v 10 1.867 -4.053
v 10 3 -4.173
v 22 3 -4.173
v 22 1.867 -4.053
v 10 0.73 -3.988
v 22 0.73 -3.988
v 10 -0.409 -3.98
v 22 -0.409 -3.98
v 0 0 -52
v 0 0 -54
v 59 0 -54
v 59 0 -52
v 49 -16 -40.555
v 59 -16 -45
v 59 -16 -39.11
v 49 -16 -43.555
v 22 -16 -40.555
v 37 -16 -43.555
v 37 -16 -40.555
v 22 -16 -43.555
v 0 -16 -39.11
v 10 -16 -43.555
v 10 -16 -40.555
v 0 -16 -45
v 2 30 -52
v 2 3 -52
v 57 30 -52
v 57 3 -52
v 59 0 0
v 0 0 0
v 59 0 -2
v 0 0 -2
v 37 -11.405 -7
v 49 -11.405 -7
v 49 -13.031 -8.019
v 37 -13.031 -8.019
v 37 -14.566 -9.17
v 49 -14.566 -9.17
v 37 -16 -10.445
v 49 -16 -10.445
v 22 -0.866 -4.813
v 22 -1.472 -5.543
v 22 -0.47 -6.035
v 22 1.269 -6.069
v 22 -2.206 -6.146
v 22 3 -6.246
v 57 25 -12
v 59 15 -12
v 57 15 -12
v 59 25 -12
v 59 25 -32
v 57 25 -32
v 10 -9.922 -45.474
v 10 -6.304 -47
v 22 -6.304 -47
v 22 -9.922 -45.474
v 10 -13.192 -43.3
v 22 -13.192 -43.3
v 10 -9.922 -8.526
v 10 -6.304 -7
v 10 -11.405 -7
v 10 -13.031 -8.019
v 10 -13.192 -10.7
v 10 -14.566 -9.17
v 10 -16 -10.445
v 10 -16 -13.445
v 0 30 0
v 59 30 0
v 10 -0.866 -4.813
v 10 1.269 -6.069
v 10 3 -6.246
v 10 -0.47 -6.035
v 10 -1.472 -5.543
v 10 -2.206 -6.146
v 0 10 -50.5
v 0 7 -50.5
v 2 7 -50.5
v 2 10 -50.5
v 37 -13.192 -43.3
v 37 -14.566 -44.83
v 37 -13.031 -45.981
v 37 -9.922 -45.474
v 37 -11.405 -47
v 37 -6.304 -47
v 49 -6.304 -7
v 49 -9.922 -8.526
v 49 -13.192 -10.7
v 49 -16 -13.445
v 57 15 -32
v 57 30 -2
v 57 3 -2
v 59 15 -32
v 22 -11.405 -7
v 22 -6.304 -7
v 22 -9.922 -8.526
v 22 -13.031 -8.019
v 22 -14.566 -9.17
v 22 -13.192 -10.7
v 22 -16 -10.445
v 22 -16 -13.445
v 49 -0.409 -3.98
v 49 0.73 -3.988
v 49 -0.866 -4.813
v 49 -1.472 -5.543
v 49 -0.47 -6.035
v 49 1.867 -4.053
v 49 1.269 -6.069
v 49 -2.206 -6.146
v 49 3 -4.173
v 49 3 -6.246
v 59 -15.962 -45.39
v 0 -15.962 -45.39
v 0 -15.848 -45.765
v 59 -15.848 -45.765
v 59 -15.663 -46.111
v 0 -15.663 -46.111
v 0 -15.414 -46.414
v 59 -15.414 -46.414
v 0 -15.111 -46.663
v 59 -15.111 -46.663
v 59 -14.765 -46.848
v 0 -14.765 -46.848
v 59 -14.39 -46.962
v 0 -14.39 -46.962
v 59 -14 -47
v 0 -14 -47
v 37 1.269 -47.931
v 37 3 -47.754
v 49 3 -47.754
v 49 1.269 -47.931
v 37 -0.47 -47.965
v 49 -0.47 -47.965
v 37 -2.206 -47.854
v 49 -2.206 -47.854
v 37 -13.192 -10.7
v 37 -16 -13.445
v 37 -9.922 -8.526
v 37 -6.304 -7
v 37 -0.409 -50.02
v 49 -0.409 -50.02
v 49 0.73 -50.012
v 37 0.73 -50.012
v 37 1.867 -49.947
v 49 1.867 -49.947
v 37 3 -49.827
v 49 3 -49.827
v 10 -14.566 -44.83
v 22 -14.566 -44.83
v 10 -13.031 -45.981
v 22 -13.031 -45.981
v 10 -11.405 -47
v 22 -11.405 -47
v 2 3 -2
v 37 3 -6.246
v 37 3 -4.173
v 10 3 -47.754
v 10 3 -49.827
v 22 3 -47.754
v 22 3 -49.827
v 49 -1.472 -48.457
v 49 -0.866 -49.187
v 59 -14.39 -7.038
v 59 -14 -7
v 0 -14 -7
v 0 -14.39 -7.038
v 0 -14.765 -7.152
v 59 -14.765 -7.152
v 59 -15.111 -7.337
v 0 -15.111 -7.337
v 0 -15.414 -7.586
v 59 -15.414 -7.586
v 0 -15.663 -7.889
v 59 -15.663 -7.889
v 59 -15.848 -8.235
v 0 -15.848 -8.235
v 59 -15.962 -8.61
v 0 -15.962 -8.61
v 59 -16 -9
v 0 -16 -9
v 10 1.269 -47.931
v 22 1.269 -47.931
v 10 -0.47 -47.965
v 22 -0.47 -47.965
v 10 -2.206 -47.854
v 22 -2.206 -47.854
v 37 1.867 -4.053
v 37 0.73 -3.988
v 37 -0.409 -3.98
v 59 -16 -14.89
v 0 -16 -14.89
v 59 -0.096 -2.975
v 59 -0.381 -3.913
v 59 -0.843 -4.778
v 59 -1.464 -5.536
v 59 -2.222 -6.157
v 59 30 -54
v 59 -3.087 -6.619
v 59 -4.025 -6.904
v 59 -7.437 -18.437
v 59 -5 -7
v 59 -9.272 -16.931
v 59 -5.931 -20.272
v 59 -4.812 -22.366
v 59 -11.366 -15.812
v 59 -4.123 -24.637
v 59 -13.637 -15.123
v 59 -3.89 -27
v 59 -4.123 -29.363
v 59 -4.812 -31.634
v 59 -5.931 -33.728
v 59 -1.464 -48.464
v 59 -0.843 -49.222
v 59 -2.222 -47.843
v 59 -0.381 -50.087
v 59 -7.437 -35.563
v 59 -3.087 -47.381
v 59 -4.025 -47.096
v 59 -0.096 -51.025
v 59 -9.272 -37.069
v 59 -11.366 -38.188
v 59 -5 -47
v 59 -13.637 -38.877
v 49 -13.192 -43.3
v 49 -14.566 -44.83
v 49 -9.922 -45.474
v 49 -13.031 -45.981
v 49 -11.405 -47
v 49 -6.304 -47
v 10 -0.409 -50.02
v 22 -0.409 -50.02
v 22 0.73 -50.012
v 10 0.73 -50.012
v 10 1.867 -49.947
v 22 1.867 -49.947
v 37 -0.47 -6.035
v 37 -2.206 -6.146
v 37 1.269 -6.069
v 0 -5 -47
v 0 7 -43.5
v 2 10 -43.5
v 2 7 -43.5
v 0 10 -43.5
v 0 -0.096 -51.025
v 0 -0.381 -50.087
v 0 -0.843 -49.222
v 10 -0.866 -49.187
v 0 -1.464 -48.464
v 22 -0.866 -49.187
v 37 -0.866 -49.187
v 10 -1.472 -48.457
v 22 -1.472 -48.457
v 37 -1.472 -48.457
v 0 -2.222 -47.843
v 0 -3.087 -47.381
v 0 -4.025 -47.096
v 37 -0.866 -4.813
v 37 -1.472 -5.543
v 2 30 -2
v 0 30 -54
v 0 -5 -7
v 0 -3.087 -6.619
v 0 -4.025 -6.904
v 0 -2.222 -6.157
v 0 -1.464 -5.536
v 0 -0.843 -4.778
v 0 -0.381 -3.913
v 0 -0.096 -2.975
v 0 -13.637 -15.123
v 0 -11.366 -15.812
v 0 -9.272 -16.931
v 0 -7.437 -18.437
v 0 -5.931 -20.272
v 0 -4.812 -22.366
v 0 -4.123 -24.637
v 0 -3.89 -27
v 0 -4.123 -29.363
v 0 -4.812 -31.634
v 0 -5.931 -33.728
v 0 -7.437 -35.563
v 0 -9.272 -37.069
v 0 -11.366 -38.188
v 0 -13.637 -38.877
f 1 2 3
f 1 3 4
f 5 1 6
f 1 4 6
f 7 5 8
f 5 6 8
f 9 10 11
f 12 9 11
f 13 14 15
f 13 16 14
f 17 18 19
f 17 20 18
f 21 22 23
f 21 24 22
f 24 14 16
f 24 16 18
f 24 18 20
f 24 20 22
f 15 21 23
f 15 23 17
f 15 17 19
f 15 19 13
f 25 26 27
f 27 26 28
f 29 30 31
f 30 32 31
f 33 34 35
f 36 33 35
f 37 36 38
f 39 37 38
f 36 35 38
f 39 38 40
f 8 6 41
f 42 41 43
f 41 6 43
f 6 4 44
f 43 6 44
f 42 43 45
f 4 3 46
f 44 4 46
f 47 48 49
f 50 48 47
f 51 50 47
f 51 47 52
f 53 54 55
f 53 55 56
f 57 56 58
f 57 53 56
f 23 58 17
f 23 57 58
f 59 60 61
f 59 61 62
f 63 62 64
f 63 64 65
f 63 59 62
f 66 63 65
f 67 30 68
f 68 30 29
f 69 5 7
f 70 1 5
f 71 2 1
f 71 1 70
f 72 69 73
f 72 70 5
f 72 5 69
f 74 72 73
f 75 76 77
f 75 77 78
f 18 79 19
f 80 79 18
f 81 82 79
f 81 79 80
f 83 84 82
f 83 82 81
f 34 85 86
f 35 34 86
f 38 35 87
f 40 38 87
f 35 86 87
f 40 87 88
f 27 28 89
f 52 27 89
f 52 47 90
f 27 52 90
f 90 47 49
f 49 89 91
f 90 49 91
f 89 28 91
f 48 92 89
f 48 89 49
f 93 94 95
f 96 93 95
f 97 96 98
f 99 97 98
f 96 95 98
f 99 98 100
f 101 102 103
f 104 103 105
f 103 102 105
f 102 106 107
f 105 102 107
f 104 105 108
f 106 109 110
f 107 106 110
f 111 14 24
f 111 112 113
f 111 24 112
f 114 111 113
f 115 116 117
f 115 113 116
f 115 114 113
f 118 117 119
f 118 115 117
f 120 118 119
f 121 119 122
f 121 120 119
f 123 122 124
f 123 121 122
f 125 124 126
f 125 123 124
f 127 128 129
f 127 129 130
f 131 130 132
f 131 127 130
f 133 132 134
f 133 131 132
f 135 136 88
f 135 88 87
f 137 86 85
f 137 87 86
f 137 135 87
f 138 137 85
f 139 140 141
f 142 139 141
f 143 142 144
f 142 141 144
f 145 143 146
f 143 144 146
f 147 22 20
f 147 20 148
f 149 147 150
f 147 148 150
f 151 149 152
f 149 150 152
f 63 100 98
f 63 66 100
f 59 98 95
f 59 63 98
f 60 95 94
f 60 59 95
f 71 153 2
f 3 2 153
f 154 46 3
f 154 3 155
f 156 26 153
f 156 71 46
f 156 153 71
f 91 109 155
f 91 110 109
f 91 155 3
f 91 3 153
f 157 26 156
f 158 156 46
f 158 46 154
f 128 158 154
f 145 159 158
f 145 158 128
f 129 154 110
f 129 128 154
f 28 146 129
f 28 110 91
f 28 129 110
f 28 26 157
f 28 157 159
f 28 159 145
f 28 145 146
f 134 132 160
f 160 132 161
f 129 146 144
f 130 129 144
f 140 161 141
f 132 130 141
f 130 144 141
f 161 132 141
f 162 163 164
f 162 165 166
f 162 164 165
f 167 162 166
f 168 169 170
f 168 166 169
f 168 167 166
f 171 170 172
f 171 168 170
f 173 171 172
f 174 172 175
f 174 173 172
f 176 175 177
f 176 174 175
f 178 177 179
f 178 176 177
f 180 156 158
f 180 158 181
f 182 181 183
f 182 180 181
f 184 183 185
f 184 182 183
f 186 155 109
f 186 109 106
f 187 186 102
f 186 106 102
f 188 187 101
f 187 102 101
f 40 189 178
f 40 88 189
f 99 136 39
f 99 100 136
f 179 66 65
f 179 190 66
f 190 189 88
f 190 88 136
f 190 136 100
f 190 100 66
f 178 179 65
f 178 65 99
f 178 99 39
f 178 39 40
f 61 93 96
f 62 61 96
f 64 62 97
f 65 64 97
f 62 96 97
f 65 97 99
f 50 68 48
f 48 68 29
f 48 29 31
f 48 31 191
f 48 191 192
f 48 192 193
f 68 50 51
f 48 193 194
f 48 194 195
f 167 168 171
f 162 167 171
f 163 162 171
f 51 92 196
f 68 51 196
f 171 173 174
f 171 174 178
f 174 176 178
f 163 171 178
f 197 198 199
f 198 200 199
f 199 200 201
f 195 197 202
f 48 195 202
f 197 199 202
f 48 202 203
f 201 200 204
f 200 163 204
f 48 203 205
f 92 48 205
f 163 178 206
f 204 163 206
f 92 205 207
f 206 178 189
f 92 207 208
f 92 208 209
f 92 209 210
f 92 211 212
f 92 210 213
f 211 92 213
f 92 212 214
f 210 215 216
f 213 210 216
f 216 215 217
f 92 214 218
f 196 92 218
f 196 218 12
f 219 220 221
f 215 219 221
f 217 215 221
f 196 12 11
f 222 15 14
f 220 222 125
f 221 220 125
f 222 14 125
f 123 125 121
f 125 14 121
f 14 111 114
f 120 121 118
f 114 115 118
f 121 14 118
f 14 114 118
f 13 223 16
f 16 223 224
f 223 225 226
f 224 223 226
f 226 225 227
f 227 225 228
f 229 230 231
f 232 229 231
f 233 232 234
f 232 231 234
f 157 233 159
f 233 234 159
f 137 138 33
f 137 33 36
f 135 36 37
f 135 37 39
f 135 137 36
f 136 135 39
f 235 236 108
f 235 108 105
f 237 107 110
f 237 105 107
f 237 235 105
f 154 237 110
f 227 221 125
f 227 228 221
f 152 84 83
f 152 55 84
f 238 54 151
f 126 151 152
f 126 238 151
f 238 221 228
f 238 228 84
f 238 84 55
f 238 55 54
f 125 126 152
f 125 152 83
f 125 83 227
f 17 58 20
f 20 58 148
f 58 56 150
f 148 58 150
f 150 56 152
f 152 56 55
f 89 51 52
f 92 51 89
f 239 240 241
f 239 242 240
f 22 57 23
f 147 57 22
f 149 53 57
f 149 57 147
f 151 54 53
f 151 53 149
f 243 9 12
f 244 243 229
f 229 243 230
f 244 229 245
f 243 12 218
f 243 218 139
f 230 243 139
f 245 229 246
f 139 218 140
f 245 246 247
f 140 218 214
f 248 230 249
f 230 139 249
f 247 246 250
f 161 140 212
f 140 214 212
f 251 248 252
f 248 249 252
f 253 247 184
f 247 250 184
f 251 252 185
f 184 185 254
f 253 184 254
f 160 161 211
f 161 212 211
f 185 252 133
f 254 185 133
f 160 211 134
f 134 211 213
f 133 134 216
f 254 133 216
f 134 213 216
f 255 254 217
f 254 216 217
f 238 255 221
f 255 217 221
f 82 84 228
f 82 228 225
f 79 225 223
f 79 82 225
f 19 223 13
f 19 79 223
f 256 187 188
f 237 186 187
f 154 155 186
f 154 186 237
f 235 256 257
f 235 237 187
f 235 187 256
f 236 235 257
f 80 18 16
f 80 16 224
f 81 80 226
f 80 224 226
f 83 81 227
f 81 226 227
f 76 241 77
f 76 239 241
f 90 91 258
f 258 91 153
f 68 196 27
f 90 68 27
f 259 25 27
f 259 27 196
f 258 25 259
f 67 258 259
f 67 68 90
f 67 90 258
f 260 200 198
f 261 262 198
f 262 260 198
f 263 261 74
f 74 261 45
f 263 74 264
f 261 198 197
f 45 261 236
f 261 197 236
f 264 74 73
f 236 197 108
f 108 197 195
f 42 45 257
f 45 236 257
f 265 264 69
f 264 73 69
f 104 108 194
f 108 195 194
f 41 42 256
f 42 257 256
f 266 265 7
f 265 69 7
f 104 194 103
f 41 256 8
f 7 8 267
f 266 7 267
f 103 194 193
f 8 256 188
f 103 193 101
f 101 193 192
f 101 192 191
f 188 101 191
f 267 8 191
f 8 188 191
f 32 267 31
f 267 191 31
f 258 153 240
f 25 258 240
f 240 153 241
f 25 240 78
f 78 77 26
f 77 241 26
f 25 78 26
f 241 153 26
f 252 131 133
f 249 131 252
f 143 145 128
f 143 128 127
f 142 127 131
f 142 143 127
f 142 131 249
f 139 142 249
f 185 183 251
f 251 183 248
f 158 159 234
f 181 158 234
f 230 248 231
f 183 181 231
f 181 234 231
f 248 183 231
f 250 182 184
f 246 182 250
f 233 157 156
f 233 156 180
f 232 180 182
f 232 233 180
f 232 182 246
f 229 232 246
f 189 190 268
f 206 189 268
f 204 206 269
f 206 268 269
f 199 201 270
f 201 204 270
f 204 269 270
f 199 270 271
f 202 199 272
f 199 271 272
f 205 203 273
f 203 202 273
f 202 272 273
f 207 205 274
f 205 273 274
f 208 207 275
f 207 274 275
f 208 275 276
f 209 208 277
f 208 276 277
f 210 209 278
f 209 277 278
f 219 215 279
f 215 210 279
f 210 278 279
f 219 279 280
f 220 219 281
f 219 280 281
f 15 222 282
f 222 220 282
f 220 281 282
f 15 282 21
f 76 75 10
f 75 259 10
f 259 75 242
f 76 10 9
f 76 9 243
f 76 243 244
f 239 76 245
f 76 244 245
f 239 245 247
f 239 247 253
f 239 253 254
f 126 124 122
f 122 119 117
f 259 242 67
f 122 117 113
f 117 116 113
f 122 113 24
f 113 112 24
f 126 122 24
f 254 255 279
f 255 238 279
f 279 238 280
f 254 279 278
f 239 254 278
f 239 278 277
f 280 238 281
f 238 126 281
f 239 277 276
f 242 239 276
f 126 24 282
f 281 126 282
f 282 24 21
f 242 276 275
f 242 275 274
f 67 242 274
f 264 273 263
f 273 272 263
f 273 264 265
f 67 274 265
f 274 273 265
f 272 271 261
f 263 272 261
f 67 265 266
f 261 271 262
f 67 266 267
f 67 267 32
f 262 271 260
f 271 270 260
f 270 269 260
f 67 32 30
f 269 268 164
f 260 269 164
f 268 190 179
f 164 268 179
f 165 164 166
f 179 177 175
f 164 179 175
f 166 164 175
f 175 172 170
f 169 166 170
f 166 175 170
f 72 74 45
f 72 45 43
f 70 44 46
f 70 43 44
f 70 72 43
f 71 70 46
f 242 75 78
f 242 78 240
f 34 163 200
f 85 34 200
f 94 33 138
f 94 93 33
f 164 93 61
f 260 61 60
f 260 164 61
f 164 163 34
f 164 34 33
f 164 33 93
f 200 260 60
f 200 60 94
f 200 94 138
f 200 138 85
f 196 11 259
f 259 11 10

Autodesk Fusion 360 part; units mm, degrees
sketch "Sketch1" plane through (0, 0, 0) normal (0, 1, 0) x (1, 0, 0)
  line L0 (0, 0) -> (59, 0)
  line L1 (59, 0) -> (59, 54)
  line L2 (59, 54) -> (0, 54)
  line L3 (0, 54) -> (0, 0)
  dimension "d1" = 59
  dimension "d2" = 54
extrude "Extrude1" add sketch "Sketch1" along normal blind 3 makes body 1
sketch "Sketch2" plane through (0, 3, 0) normal (0, 1, 0) x (-1, 0, 0)
  line L0 (0, -54) -> (0, 0)
  line L1 (0, 0) -> (-59, 0)
  line L2 (-59, 0) -> (-59, -54)
  line L3 (-59, -54) -> (0, -54)
  line L4 (-57, -2) -> (-2, -2)
  line L5 (-2, -2) -> (-2, -52)
  line L6 (-2, -52) -> (-57, -52)
  line L7 (-57, -52) -> (-57, -2)
  line L8 (-57, -2) -> (-2, -52) construction
  line L9 (-2, -2) -> (-57, -52) construction
  point P0 (-29.5, -27)
  dimension "d5" = 55
  dimension "d6" = 50
  dimension "d15" = 27
  dimension "d16" = 29.5
extrude "Extrude2" add sketch "Sketch2" along normal blind 27 bodies 1
sketch "Sketch3" plane through (59, 0, 0) normal (1, 0, 0) x (0, 0, -1)
  line L0 (0, 0) -> (54, 0)
  line L1 (54, 0) -> (54, 30)
  line L2 (54, 30) -> (0, 30)
  line L3 (0, 30) -> (0, 0)
  line L4 (12, 25) -> (32, 25)
  line L5 (32, 25) -> (32, 15)
  line L6 (32, 15) -> (12, 15)
  line L7 (12, 15) -> (12, 25)
  dimension "d9" = 20
  dimension "d10" = 10
  dimension "d11" = 12
  dimension "d12" = 15
extrude "Extrude3" cut sketch "Sketch3" against normal blind 3 contours L4 L5 L6 L7 bodies 1
sketch "Sketch4" plane through (0, 0, 0) normal (-1, 0, 0) x (0, 0, 1)
  line L0 (-54, 0) -> (0, 0)
  line L1 (0, 0) -> (0, 30)
  line L2 (0, 30) -> (-54, 30)
  line L3 (-54, 30) -> (-54, 0)
  line L4 (-50.5, 10) -> (-43.5, 10)
  line L5 (-43.5, 10) -> (-43.5, 7)
  line L6 (-43.5, 7) -> (-50.5, 7)
  line L7 (-50.5, 7) -> (-50.5, 10)
  dimension "d17" = 7
  dimension "d18" = 3
  dimension "d19" = 7
  dimension "d20" = 3.5
extrude "Extrude4" cut sketch "Sketch4" against normal blind 4 contours L4 L5 L6 L7 bodies 1
sketch "Sketch11" plane through (0, 0, 0) normal (1, 0, 0) x (0, 0, -1)
  circle A0 centre (27, -16) radius 12.11
  line L0 (0, 0) -> (54, 0)
  line L1 (7, 0) -> (47, 0)
  line L2 (47, 0) -> (47, -16)
  line L3 (47, -16) -> (7, -16)
  line L4 (7, -16) -> (7, 0)
  line L5 (54, 0) -> (54, 30)
  dimension "d55" = 24.22
  dimension "d57" = 16
  dimension "d60" = 40
  dimension "d65" = 7
  dimension "d67" = 16
extrude "Extrude9" add sketch "Sketch11" along normal blind 59 separate body contours A0 L0 L1 L2 L3 L4 makes body 2
sketch "Sketch12" plane through (0, 0, 0) normal (0, 1, 0) x (1, 0, 0)
  line L0 (-4, 27) -> (62, 27)
  line L1 (-5, 0) -> (64, 0)
  line L2 (-3, 54) -> (63, 54)
  dimension "d64" = 27
combine "Combine1" operation add target body 2 tool bodies 1
fillet "Fillet1" radius 5 1 edges at (29.5, 0, -7) on bodies 2
fillet "Fillet2" radius 5 1 edges at (29.5, 0, -47) on bodies 2
sketch "Sketch16" plane through (0, -16, 0) normal (0, -1, 0) x (1, 0, 0)
  line L0 (0, -39.11) -> (0, -47)
  line L1 (0, -47) -> (59, -47)
  line L2 (59, -47) -> (59, -39.11)
  line L3 (59, -39.11) -> (0, -39.11)
  line L4 (22, -40.555) -> (10, -40.555)
  line L5 (10, -40.555) -> (10, -43.555)
  line L6 (10, -43.555) -> (22, -43.555)
  line L7 (22, -43.555) -> (22, -40.555)
  line L8 (22, -40.555) -> (10, -43.555) construction
  line L9 (10, -40.555) -> (22, -43.555) construction
  line L10 (37, -40.555) -> (37, -43.555)
  line L11 (49, -43.555) -> (49, -40.555)
  line L12 (37, -40.555) -> (49, -43.555) construction
  line L13 (37, -43.555) -> (49, -43.555)
  line L14 (49, -40.555) -> (37, -40.555)
  line L15 (49, -40.555) -> (37, -43.555) construction
  point P0 (16, -42.055)
  point P1 (43, -42.055)
  dimension "d72" = 12
  dimension "d73" = 3
  dimension "d74" = 4.945
  dimension "d75" = 12
  dimension "d76" = 3
  dimension "d77" = 10
  dimension "d78" = 10
  dimension "d84" = 4.945
revolve "Revolve1" cut sketch "Sketch16" angle 360 about axis through (-4, 0, -27) along (1, 0, 0) contours L4 L5 L6 L7 | L10 L11 L13 L14 bodies 2
fillet "Fillet3" radius 2 1 edges at (29.5, -16, -47) on bodies 2
fillet "Fillet4" radius 2 1 edges at (29.5, -16, -7) on bodies 2
equation "d74 = 4.5 mm + 0.445 mm"
equation "d84 = 4.5 mm + 0.445 mm"
